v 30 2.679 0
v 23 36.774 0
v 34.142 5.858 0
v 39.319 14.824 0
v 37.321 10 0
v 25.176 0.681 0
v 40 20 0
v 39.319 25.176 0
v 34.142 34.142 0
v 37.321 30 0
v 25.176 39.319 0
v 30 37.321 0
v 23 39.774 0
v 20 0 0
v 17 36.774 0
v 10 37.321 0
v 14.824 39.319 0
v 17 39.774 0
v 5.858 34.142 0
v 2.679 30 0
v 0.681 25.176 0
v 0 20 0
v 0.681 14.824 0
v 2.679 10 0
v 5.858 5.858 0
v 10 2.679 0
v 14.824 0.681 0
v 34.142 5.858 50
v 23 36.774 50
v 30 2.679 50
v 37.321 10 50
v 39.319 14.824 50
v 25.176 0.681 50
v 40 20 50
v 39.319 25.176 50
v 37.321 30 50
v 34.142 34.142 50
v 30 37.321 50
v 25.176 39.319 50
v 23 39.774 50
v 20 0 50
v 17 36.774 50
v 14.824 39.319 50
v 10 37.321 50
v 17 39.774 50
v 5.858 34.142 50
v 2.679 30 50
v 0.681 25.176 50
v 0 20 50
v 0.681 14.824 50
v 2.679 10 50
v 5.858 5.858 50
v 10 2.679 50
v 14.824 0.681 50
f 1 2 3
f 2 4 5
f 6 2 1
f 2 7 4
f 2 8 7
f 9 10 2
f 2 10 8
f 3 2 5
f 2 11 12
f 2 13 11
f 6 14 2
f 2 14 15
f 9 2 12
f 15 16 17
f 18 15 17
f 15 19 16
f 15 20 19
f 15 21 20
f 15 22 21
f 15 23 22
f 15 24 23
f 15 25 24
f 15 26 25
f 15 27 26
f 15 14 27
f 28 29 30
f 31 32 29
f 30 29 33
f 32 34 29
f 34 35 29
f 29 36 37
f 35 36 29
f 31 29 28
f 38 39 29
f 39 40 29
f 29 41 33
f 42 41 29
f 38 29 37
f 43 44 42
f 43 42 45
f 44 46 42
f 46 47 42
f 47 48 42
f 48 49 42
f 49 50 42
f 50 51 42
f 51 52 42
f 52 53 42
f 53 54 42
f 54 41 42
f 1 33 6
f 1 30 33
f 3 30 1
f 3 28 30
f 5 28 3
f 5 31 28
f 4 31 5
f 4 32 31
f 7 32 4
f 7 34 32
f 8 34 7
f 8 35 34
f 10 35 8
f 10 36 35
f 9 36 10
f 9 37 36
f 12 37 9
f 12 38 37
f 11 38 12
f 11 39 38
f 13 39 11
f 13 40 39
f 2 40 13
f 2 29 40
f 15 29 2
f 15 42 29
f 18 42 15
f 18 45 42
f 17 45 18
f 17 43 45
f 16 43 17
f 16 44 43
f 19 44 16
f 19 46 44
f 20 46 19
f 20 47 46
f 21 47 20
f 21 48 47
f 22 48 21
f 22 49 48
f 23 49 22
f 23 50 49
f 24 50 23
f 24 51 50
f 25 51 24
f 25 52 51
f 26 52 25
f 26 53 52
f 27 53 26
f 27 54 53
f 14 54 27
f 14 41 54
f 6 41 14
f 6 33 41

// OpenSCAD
$fn = 32;

// ----------------------------------------------------------------------
// Keyway shaft: d40 shaft, key 6 x 3 mm
// ----------------------------------------------------------------------

// --- parameters (mm) ---
shaft_r = 20;             // shaft radius
key_w = 6;                // keyway width
key_d = 3;                // keyway depth below the surface line
plate_t = 50;             // shaft length, Z (extrusion height)

shaft_d = 2 * shaft_r;  // shaft diameter
circle_step = 15;  // polygon sampling step, degrees

profile = [[14.824, 39.319], [10, 37.321], [5.858, 34.142], [2.679, 30], [0.681, 25.176], [0, 20], [0.681, 14.824], [2.679, 10], [5.858, 5.858], [10, 2.679], [14.824, 0.681], [20, 0], [25.176, 0.681], [30, 2.679], [34.142, 5.858], [37.321, 10], [39.319, 14.824], [40, 20], [39.319, 25.176], [37.321, 30], [34.142, 34.142], [30, 37.321], [25.176, 39.319], [23, 39.774], [23, 36.774], [17, 36.774], [17, 39.774]];  // primary outline, 27 points, counter clockwise

// --- the one profile operation ---
linear_extrude(height = plate_t) polygon(points = profile);
